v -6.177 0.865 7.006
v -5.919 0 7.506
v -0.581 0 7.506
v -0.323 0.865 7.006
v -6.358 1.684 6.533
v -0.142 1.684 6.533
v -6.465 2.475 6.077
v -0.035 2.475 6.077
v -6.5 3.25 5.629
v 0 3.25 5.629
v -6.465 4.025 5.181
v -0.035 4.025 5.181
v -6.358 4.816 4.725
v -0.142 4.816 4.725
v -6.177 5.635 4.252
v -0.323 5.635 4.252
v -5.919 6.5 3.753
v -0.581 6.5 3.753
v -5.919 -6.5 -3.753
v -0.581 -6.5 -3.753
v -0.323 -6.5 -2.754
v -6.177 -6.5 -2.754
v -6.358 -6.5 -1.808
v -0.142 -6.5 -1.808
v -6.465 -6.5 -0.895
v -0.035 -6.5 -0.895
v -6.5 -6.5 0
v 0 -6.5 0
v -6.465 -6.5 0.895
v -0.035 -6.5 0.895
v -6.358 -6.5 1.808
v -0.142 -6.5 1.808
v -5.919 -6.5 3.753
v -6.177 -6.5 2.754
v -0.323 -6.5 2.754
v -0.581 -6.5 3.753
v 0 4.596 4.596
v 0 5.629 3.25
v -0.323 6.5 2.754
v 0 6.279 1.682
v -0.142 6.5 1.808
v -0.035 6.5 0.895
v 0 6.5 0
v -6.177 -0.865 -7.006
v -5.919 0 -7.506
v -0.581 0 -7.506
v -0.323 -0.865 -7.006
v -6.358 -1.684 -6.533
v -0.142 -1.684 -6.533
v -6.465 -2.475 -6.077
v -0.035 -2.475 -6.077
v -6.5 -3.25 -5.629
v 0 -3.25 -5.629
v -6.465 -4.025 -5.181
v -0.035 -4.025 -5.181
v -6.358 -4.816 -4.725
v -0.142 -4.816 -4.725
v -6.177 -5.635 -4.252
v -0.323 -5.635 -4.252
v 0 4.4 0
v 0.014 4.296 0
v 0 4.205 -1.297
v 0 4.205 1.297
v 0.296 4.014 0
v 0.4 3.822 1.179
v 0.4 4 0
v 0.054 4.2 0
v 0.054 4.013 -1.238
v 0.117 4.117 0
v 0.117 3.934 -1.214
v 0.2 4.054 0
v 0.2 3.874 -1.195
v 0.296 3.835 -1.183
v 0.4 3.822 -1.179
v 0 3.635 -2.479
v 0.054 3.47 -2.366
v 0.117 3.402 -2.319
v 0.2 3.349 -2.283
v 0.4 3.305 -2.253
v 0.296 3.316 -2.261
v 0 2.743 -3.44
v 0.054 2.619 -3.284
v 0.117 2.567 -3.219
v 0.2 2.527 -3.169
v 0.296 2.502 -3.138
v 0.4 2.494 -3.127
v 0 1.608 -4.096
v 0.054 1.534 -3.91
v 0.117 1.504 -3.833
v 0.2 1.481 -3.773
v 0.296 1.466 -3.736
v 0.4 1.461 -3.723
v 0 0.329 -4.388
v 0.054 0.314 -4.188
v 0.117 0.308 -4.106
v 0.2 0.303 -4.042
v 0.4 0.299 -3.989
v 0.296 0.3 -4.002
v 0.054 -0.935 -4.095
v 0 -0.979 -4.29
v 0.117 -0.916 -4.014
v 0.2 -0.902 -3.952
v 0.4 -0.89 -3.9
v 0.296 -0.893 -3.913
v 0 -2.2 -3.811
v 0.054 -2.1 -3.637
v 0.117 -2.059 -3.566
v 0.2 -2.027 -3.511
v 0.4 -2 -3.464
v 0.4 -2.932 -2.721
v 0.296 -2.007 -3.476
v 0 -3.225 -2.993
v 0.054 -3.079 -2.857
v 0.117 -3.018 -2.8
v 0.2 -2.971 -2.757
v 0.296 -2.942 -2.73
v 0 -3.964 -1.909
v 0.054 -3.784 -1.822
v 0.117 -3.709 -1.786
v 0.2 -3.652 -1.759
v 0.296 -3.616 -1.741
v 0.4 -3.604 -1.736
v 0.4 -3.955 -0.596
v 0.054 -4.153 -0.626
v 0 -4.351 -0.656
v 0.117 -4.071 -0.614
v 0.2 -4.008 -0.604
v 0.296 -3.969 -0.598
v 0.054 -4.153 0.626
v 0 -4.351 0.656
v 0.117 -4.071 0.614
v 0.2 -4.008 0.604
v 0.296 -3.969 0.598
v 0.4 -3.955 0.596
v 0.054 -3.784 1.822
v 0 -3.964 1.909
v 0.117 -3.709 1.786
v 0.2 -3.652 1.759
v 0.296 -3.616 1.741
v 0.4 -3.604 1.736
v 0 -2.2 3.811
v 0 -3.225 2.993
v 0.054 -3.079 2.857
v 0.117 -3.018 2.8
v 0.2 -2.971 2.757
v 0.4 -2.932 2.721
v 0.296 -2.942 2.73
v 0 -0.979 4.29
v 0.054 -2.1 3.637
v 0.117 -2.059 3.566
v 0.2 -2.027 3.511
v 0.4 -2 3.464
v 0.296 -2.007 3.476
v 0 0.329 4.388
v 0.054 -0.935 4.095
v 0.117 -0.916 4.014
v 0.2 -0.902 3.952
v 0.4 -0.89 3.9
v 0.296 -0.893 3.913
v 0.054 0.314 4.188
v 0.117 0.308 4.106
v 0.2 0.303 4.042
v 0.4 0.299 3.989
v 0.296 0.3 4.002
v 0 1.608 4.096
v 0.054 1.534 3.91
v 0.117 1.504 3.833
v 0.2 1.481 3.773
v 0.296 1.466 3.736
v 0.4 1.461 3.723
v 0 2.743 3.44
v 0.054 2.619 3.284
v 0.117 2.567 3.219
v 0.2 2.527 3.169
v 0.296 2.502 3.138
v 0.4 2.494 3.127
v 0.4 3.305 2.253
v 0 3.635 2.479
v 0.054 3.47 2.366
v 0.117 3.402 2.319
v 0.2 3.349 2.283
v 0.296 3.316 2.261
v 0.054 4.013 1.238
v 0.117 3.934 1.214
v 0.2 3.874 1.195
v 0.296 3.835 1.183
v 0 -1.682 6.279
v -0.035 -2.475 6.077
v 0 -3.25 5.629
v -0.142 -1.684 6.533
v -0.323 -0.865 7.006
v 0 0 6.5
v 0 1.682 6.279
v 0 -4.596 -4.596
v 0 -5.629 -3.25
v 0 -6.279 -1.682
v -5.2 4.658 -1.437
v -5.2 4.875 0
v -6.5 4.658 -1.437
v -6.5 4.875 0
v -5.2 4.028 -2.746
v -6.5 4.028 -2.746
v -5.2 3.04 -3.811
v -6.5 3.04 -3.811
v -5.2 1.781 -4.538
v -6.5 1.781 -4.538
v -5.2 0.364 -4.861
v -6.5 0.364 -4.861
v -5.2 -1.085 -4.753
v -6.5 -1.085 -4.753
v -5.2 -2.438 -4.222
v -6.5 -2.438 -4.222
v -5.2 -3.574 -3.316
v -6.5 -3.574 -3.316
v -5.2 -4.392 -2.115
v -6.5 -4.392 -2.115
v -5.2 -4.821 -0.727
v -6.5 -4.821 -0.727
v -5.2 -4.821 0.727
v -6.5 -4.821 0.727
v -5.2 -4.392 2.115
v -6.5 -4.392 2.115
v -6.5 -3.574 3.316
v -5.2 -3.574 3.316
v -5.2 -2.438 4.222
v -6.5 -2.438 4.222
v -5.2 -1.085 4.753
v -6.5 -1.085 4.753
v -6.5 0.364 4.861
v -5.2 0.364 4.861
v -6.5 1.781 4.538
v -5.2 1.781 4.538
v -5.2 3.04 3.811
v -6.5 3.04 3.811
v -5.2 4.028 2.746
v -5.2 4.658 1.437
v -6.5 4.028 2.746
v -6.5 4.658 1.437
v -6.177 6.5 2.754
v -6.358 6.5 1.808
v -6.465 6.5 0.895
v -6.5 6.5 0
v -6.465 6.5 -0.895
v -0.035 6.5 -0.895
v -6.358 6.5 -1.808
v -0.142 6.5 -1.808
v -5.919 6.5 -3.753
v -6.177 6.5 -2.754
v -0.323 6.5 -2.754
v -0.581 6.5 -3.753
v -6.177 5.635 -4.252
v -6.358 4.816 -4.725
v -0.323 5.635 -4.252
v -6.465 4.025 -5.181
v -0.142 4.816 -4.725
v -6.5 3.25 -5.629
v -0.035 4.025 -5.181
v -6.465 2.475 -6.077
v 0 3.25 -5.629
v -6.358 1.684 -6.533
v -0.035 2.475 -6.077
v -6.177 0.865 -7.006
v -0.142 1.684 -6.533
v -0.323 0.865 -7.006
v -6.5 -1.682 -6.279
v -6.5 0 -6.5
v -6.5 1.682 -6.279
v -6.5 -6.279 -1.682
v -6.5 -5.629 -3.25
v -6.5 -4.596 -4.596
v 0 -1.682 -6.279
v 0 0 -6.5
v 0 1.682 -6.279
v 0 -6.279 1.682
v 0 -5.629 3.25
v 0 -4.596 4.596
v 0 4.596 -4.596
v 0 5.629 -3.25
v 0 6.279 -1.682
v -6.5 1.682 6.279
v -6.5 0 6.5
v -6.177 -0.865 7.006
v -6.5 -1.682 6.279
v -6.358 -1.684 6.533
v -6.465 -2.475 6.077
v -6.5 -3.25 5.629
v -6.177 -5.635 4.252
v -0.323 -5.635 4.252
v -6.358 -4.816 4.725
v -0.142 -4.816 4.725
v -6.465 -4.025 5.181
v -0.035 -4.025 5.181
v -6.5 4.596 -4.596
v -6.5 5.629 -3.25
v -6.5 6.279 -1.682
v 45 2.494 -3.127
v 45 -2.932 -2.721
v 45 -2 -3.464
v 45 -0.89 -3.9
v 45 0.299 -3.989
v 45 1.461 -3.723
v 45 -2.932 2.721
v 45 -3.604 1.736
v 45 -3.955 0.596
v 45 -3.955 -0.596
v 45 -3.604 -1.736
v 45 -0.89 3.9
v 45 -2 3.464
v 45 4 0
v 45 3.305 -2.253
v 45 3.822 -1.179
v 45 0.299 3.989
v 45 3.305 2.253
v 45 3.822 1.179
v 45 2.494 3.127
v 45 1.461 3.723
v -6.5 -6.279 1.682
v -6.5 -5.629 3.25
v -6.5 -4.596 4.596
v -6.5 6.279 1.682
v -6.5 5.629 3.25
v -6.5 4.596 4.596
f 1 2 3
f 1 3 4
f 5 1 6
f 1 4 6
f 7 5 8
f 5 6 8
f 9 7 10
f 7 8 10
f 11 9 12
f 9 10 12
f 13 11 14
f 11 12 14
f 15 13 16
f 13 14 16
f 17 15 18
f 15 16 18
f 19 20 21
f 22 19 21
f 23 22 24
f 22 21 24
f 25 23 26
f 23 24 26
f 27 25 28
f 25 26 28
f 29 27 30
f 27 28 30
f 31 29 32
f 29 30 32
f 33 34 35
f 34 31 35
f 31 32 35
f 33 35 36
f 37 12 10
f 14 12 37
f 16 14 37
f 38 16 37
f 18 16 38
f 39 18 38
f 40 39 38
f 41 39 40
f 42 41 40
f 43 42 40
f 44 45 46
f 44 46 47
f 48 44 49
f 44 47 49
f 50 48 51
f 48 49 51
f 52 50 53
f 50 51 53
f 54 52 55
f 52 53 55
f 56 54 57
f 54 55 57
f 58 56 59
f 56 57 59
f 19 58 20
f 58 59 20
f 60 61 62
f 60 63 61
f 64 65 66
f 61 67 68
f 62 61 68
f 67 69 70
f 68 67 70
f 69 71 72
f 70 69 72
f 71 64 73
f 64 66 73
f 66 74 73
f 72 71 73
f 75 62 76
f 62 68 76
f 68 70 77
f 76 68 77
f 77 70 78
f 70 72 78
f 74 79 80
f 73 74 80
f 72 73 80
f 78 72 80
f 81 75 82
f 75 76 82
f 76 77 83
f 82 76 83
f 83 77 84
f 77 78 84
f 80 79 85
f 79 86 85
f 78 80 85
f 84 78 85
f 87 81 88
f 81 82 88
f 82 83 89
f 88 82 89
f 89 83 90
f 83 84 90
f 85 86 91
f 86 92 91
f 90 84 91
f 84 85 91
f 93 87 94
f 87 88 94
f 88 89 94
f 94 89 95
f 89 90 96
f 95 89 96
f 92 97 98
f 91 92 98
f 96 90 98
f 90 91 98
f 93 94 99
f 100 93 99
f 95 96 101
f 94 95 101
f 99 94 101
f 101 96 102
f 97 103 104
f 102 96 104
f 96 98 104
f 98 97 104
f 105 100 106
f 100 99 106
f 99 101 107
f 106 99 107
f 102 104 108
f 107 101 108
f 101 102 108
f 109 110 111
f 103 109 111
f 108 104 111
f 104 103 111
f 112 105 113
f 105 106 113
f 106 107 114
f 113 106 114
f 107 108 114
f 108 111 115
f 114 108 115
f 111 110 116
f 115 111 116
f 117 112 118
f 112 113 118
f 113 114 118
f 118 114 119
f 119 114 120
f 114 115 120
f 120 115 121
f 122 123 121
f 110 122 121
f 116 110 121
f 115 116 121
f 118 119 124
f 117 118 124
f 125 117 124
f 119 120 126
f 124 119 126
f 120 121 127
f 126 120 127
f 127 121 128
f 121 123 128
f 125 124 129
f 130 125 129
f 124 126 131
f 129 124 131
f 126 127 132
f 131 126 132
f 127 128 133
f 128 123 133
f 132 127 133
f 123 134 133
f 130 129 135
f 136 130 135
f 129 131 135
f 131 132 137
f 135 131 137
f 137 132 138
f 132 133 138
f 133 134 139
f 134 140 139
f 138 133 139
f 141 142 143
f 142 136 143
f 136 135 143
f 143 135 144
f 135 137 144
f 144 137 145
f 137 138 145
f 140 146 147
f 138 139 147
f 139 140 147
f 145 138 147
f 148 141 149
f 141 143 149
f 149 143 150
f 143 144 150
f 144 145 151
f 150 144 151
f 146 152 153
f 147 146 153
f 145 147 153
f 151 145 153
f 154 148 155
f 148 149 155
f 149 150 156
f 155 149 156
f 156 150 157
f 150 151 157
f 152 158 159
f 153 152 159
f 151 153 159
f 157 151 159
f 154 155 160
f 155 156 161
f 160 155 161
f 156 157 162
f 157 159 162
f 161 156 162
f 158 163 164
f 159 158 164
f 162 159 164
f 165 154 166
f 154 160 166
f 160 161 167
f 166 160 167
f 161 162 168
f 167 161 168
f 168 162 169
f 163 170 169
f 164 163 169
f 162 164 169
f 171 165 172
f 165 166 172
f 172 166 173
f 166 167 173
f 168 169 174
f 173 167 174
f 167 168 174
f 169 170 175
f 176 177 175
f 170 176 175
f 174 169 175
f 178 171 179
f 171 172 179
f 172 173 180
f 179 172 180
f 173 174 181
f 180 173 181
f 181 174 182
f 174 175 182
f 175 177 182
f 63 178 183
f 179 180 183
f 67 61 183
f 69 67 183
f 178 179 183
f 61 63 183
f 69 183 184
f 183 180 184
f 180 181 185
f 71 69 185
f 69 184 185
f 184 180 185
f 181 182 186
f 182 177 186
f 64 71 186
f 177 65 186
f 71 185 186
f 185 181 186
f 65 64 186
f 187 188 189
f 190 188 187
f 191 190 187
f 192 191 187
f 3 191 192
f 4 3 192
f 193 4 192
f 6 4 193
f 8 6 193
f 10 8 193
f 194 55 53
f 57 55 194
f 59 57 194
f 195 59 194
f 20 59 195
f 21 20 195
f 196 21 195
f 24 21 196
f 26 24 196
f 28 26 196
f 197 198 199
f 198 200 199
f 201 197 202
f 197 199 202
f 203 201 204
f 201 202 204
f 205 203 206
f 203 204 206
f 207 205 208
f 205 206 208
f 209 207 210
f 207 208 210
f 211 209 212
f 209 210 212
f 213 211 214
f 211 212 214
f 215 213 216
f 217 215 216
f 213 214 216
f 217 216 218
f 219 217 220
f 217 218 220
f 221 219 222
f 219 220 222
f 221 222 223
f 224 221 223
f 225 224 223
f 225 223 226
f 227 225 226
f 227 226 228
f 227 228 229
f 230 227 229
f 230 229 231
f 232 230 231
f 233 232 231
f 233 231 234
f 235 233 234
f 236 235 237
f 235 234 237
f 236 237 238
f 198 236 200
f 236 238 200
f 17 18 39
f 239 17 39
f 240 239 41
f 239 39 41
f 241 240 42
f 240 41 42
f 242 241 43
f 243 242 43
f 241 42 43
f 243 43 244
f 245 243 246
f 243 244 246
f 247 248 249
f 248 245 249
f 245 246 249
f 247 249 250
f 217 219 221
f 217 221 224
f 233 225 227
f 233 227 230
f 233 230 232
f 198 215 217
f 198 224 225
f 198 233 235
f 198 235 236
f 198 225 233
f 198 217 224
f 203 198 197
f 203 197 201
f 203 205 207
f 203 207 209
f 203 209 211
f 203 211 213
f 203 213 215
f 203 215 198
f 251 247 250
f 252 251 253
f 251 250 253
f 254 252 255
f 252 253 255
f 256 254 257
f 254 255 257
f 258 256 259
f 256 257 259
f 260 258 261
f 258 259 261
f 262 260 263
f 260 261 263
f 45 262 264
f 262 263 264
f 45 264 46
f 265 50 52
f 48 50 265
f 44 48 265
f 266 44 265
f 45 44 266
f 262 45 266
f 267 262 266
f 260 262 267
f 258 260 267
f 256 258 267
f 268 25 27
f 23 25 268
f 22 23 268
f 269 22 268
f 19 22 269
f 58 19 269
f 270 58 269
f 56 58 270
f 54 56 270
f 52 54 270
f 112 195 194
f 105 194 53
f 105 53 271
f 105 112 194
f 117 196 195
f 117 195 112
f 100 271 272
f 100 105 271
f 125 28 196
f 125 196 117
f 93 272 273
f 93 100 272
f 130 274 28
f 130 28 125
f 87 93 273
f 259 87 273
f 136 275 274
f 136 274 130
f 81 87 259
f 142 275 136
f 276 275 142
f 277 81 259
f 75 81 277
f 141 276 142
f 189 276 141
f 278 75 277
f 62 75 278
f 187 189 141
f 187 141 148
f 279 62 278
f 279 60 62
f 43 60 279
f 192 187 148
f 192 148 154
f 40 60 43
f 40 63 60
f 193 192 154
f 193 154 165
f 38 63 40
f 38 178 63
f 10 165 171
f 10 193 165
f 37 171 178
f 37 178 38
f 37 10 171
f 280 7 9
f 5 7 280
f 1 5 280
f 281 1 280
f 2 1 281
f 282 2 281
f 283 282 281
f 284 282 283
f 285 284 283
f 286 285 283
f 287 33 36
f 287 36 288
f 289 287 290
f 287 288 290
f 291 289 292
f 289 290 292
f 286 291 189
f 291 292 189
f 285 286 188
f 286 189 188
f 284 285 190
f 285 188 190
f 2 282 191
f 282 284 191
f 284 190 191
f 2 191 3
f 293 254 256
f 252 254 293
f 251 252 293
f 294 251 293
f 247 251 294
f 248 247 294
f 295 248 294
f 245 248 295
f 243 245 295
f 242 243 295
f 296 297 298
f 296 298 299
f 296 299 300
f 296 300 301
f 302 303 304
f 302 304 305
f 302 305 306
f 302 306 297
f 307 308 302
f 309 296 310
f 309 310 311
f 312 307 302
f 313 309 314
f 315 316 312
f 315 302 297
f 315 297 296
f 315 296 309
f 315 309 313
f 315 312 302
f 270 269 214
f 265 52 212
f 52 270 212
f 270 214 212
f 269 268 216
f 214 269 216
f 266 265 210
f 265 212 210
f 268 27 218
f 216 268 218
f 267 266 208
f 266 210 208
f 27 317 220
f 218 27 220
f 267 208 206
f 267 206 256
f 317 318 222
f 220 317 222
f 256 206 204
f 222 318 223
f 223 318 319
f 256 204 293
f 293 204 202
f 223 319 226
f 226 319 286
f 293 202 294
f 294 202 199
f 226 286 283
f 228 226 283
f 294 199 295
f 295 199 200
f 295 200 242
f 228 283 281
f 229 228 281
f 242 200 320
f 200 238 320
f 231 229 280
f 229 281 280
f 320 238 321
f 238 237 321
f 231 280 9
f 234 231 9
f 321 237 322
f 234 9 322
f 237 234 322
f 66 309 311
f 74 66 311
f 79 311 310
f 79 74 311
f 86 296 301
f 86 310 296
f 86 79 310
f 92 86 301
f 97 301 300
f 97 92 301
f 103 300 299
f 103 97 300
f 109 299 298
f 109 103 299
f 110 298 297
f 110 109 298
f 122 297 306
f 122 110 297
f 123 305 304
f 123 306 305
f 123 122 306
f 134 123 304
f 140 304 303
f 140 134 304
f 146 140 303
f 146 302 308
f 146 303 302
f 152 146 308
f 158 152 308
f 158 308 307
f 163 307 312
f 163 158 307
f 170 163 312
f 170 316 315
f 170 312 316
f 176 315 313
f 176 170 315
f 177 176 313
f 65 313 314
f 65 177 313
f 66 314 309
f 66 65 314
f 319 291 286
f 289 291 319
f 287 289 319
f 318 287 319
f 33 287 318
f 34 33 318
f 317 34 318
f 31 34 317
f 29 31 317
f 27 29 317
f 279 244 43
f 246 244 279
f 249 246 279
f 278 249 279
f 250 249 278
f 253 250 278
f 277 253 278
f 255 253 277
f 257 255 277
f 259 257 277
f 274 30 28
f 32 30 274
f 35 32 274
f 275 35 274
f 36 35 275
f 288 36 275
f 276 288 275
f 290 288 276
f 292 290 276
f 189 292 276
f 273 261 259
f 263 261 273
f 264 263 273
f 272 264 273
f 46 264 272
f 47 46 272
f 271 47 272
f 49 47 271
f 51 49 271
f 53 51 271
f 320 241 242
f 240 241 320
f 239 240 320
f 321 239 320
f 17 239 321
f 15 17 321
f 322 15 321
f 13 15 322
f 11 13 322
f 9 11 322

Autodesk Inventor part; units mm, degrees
ref_plane "YZ Plane" through (0, 0, 0) normal (1, 0, 0) x (0, 1, 0)
ref_plane "XZ Plane" through (0, 0, 0) normal (0, 1, 0) x (-1, 0, 0)
sketch "Sketch1" plane through (0, 0, 0) normal (0, 0, 1) x (1, 0, 0)
  line L0 (0, 4) -> (0, 0)
  line L1 (0, 0) -> (45, 0)
  line L2 (45, 0) -> (45, 4)
  line L3 (45, 4) -> (0, 4)
  line L4 (-9, 0) -> (54, 0) projected
  line L5 (0, -0.8) -> (0, 4.8) projected
  dimension "d0" = 8
  dimension "d1" = 45
revolve "Body" add sketch "Sketch1" angle 360 about axis through (0, 0, 0) along (1, 0, 0)
sketch "Sketch2" plane through (0, 0, 0) normal (1, 0, 0) x (0, 1, 0)
  line L0 (0, 7.5056) -> (6.5, 3.7528)
  line L1 (6.5, 3.7528) -> (6.5, -3.7528)
  line L2 (6.5, -3.7528) -> (0, -7.5056)
  line L3 (0, -7.5056) -> (-6.5, -3.7528)
  line L4 (-6.5, -3.7528) -> (-6.5, 3.7528)
  line L5 (-6.5, 3.7528) -> (0, 7.5056)
  line L6 (-9.1, 0) -> (9.1, 0) projected
  line L7 (0, -10.5078) -> (0, 10.5078) projected
  point P0 (0, 0)
  point P1 (0, 0)
  dimension "d2" = 13
extrude "Head" add sketch "Sketch2" against normal blind 6.5
sketch "Sketch3" plane through (-6.5, 0, 0) normal (-1, 0, 0) x (0, 1, 0)
  circle A0 centre (0, 0) radius 4.875
  point P0 (0, 0)
  dimension "d12" = 9.75
extrude "Indent1" cut sketch "Sketch3" against normal blind 1.3
sketch "Sketch4" plane through (0, 0, 0) normal (0, 0, 1) x (1, 0, 0)
  line L0 (-6.5, 7.5056) -> (-6.5, 6.5)
  line L1 (-6.5, 6.5) -> (-5.9194, 7.5056)
  line L2 (-5.9194, 7.5056) -> (-6.5, 7.5056)
  line L3 (0, 7.5056) -> (0, 6.5)
  line L4 (0, 6.5) -> (-0.5806, 7.5056)
  line L5 (-0.5806, 7.5056) -> (0, 7.5056)
  line L6 (0, 0) -> (-6.5, 0) projected
  line L7 (-6.5, 0) -> (-6.5, 6.5) projected
  line L8 (0, 0) -> (0, 6.5) projected
  line L9 (-7.8, 0) -> (1.3, 0) projected
  line L10 (-5.9194, 7.5056) -> (-0.5806, 7.5056) construction
  line L11 (0, -1.5011) -> (0, 9.0067) projected
  dimension "d6" = 30
  dimension "d7" = 30
  dimension "d16" = 13
  dimension "d17" = 13
  dimension "d18" = 15.0111
revolve "Chamfer1" cut sketch "Sketch4" angle 360 about axis through (-10, 0, 0) along (1, 0, 0)
fillet "Fillet1" radius 0.4 1 edges at (0, -4, 0)
thread "Thread" size "M8x1.25" class "6g" standard "ISO Metric profile" length 42.5
ref_plane "Work Plane1" through (3, 0, 0) normal (0, 0.5, 0.8660254) x (1, 0, 0)
equation "\"d2\" = SW"
equation "\"d3\" = KOH"
equation "\"d12\" = 0.75 * SW0"
equation "\"d14\" = 0.2 * KOH"
equation "\"d11\" = RR"
equation "\"d8\" = GEL"
equation "\"d0\" = GD"
equation "\"d1\" = NLG"
equation "\"d6\" = ANG1"
equation "\"d7\" = ANG1"
equation "\"d16\" = SW0"
equation "\"d17\" = SW0"
equation "\"d18\" = 1.1547 * SW"
equation "\"NLG\" = 45"
equation "\"KOH\" = 6.5"
equation "\"GD\" = NND"
equation "\"GEL\" = 42.5"
equation "\"SW\" = 13"
equation "\"SW0\" = SW"
equation "\"ANG1\" = 30deg"
equation "\"RR\" = 0.4"
equation "\"GUL\" = 0.61345 * PTC"
equation "\"SPD\" = NND - 1.2269 * PTC"
equation "\"GD1\" = THREADDIA - 1.2269 * PTC"
equation "\"THREADDIA\" = 8"
equation "\"SDH\" = 9.2"
equation "\"TOA\" = 30deg"
equation "\"BDM\" = NND"
equation "\"FAWI\" = 45deg"
equation "\"PTC\" = 1.25"
equation "\"NND\" = 8"
equation "\"GAL\" = 0.61345 * PTC"
equation "\"SD\" = 0"
equation "\"SD2\" = SDH"
equation "\"E0\" = 1.155 * SW"
properties part number "AS 1427 - M8 x 45" material "Steel, Mild"
